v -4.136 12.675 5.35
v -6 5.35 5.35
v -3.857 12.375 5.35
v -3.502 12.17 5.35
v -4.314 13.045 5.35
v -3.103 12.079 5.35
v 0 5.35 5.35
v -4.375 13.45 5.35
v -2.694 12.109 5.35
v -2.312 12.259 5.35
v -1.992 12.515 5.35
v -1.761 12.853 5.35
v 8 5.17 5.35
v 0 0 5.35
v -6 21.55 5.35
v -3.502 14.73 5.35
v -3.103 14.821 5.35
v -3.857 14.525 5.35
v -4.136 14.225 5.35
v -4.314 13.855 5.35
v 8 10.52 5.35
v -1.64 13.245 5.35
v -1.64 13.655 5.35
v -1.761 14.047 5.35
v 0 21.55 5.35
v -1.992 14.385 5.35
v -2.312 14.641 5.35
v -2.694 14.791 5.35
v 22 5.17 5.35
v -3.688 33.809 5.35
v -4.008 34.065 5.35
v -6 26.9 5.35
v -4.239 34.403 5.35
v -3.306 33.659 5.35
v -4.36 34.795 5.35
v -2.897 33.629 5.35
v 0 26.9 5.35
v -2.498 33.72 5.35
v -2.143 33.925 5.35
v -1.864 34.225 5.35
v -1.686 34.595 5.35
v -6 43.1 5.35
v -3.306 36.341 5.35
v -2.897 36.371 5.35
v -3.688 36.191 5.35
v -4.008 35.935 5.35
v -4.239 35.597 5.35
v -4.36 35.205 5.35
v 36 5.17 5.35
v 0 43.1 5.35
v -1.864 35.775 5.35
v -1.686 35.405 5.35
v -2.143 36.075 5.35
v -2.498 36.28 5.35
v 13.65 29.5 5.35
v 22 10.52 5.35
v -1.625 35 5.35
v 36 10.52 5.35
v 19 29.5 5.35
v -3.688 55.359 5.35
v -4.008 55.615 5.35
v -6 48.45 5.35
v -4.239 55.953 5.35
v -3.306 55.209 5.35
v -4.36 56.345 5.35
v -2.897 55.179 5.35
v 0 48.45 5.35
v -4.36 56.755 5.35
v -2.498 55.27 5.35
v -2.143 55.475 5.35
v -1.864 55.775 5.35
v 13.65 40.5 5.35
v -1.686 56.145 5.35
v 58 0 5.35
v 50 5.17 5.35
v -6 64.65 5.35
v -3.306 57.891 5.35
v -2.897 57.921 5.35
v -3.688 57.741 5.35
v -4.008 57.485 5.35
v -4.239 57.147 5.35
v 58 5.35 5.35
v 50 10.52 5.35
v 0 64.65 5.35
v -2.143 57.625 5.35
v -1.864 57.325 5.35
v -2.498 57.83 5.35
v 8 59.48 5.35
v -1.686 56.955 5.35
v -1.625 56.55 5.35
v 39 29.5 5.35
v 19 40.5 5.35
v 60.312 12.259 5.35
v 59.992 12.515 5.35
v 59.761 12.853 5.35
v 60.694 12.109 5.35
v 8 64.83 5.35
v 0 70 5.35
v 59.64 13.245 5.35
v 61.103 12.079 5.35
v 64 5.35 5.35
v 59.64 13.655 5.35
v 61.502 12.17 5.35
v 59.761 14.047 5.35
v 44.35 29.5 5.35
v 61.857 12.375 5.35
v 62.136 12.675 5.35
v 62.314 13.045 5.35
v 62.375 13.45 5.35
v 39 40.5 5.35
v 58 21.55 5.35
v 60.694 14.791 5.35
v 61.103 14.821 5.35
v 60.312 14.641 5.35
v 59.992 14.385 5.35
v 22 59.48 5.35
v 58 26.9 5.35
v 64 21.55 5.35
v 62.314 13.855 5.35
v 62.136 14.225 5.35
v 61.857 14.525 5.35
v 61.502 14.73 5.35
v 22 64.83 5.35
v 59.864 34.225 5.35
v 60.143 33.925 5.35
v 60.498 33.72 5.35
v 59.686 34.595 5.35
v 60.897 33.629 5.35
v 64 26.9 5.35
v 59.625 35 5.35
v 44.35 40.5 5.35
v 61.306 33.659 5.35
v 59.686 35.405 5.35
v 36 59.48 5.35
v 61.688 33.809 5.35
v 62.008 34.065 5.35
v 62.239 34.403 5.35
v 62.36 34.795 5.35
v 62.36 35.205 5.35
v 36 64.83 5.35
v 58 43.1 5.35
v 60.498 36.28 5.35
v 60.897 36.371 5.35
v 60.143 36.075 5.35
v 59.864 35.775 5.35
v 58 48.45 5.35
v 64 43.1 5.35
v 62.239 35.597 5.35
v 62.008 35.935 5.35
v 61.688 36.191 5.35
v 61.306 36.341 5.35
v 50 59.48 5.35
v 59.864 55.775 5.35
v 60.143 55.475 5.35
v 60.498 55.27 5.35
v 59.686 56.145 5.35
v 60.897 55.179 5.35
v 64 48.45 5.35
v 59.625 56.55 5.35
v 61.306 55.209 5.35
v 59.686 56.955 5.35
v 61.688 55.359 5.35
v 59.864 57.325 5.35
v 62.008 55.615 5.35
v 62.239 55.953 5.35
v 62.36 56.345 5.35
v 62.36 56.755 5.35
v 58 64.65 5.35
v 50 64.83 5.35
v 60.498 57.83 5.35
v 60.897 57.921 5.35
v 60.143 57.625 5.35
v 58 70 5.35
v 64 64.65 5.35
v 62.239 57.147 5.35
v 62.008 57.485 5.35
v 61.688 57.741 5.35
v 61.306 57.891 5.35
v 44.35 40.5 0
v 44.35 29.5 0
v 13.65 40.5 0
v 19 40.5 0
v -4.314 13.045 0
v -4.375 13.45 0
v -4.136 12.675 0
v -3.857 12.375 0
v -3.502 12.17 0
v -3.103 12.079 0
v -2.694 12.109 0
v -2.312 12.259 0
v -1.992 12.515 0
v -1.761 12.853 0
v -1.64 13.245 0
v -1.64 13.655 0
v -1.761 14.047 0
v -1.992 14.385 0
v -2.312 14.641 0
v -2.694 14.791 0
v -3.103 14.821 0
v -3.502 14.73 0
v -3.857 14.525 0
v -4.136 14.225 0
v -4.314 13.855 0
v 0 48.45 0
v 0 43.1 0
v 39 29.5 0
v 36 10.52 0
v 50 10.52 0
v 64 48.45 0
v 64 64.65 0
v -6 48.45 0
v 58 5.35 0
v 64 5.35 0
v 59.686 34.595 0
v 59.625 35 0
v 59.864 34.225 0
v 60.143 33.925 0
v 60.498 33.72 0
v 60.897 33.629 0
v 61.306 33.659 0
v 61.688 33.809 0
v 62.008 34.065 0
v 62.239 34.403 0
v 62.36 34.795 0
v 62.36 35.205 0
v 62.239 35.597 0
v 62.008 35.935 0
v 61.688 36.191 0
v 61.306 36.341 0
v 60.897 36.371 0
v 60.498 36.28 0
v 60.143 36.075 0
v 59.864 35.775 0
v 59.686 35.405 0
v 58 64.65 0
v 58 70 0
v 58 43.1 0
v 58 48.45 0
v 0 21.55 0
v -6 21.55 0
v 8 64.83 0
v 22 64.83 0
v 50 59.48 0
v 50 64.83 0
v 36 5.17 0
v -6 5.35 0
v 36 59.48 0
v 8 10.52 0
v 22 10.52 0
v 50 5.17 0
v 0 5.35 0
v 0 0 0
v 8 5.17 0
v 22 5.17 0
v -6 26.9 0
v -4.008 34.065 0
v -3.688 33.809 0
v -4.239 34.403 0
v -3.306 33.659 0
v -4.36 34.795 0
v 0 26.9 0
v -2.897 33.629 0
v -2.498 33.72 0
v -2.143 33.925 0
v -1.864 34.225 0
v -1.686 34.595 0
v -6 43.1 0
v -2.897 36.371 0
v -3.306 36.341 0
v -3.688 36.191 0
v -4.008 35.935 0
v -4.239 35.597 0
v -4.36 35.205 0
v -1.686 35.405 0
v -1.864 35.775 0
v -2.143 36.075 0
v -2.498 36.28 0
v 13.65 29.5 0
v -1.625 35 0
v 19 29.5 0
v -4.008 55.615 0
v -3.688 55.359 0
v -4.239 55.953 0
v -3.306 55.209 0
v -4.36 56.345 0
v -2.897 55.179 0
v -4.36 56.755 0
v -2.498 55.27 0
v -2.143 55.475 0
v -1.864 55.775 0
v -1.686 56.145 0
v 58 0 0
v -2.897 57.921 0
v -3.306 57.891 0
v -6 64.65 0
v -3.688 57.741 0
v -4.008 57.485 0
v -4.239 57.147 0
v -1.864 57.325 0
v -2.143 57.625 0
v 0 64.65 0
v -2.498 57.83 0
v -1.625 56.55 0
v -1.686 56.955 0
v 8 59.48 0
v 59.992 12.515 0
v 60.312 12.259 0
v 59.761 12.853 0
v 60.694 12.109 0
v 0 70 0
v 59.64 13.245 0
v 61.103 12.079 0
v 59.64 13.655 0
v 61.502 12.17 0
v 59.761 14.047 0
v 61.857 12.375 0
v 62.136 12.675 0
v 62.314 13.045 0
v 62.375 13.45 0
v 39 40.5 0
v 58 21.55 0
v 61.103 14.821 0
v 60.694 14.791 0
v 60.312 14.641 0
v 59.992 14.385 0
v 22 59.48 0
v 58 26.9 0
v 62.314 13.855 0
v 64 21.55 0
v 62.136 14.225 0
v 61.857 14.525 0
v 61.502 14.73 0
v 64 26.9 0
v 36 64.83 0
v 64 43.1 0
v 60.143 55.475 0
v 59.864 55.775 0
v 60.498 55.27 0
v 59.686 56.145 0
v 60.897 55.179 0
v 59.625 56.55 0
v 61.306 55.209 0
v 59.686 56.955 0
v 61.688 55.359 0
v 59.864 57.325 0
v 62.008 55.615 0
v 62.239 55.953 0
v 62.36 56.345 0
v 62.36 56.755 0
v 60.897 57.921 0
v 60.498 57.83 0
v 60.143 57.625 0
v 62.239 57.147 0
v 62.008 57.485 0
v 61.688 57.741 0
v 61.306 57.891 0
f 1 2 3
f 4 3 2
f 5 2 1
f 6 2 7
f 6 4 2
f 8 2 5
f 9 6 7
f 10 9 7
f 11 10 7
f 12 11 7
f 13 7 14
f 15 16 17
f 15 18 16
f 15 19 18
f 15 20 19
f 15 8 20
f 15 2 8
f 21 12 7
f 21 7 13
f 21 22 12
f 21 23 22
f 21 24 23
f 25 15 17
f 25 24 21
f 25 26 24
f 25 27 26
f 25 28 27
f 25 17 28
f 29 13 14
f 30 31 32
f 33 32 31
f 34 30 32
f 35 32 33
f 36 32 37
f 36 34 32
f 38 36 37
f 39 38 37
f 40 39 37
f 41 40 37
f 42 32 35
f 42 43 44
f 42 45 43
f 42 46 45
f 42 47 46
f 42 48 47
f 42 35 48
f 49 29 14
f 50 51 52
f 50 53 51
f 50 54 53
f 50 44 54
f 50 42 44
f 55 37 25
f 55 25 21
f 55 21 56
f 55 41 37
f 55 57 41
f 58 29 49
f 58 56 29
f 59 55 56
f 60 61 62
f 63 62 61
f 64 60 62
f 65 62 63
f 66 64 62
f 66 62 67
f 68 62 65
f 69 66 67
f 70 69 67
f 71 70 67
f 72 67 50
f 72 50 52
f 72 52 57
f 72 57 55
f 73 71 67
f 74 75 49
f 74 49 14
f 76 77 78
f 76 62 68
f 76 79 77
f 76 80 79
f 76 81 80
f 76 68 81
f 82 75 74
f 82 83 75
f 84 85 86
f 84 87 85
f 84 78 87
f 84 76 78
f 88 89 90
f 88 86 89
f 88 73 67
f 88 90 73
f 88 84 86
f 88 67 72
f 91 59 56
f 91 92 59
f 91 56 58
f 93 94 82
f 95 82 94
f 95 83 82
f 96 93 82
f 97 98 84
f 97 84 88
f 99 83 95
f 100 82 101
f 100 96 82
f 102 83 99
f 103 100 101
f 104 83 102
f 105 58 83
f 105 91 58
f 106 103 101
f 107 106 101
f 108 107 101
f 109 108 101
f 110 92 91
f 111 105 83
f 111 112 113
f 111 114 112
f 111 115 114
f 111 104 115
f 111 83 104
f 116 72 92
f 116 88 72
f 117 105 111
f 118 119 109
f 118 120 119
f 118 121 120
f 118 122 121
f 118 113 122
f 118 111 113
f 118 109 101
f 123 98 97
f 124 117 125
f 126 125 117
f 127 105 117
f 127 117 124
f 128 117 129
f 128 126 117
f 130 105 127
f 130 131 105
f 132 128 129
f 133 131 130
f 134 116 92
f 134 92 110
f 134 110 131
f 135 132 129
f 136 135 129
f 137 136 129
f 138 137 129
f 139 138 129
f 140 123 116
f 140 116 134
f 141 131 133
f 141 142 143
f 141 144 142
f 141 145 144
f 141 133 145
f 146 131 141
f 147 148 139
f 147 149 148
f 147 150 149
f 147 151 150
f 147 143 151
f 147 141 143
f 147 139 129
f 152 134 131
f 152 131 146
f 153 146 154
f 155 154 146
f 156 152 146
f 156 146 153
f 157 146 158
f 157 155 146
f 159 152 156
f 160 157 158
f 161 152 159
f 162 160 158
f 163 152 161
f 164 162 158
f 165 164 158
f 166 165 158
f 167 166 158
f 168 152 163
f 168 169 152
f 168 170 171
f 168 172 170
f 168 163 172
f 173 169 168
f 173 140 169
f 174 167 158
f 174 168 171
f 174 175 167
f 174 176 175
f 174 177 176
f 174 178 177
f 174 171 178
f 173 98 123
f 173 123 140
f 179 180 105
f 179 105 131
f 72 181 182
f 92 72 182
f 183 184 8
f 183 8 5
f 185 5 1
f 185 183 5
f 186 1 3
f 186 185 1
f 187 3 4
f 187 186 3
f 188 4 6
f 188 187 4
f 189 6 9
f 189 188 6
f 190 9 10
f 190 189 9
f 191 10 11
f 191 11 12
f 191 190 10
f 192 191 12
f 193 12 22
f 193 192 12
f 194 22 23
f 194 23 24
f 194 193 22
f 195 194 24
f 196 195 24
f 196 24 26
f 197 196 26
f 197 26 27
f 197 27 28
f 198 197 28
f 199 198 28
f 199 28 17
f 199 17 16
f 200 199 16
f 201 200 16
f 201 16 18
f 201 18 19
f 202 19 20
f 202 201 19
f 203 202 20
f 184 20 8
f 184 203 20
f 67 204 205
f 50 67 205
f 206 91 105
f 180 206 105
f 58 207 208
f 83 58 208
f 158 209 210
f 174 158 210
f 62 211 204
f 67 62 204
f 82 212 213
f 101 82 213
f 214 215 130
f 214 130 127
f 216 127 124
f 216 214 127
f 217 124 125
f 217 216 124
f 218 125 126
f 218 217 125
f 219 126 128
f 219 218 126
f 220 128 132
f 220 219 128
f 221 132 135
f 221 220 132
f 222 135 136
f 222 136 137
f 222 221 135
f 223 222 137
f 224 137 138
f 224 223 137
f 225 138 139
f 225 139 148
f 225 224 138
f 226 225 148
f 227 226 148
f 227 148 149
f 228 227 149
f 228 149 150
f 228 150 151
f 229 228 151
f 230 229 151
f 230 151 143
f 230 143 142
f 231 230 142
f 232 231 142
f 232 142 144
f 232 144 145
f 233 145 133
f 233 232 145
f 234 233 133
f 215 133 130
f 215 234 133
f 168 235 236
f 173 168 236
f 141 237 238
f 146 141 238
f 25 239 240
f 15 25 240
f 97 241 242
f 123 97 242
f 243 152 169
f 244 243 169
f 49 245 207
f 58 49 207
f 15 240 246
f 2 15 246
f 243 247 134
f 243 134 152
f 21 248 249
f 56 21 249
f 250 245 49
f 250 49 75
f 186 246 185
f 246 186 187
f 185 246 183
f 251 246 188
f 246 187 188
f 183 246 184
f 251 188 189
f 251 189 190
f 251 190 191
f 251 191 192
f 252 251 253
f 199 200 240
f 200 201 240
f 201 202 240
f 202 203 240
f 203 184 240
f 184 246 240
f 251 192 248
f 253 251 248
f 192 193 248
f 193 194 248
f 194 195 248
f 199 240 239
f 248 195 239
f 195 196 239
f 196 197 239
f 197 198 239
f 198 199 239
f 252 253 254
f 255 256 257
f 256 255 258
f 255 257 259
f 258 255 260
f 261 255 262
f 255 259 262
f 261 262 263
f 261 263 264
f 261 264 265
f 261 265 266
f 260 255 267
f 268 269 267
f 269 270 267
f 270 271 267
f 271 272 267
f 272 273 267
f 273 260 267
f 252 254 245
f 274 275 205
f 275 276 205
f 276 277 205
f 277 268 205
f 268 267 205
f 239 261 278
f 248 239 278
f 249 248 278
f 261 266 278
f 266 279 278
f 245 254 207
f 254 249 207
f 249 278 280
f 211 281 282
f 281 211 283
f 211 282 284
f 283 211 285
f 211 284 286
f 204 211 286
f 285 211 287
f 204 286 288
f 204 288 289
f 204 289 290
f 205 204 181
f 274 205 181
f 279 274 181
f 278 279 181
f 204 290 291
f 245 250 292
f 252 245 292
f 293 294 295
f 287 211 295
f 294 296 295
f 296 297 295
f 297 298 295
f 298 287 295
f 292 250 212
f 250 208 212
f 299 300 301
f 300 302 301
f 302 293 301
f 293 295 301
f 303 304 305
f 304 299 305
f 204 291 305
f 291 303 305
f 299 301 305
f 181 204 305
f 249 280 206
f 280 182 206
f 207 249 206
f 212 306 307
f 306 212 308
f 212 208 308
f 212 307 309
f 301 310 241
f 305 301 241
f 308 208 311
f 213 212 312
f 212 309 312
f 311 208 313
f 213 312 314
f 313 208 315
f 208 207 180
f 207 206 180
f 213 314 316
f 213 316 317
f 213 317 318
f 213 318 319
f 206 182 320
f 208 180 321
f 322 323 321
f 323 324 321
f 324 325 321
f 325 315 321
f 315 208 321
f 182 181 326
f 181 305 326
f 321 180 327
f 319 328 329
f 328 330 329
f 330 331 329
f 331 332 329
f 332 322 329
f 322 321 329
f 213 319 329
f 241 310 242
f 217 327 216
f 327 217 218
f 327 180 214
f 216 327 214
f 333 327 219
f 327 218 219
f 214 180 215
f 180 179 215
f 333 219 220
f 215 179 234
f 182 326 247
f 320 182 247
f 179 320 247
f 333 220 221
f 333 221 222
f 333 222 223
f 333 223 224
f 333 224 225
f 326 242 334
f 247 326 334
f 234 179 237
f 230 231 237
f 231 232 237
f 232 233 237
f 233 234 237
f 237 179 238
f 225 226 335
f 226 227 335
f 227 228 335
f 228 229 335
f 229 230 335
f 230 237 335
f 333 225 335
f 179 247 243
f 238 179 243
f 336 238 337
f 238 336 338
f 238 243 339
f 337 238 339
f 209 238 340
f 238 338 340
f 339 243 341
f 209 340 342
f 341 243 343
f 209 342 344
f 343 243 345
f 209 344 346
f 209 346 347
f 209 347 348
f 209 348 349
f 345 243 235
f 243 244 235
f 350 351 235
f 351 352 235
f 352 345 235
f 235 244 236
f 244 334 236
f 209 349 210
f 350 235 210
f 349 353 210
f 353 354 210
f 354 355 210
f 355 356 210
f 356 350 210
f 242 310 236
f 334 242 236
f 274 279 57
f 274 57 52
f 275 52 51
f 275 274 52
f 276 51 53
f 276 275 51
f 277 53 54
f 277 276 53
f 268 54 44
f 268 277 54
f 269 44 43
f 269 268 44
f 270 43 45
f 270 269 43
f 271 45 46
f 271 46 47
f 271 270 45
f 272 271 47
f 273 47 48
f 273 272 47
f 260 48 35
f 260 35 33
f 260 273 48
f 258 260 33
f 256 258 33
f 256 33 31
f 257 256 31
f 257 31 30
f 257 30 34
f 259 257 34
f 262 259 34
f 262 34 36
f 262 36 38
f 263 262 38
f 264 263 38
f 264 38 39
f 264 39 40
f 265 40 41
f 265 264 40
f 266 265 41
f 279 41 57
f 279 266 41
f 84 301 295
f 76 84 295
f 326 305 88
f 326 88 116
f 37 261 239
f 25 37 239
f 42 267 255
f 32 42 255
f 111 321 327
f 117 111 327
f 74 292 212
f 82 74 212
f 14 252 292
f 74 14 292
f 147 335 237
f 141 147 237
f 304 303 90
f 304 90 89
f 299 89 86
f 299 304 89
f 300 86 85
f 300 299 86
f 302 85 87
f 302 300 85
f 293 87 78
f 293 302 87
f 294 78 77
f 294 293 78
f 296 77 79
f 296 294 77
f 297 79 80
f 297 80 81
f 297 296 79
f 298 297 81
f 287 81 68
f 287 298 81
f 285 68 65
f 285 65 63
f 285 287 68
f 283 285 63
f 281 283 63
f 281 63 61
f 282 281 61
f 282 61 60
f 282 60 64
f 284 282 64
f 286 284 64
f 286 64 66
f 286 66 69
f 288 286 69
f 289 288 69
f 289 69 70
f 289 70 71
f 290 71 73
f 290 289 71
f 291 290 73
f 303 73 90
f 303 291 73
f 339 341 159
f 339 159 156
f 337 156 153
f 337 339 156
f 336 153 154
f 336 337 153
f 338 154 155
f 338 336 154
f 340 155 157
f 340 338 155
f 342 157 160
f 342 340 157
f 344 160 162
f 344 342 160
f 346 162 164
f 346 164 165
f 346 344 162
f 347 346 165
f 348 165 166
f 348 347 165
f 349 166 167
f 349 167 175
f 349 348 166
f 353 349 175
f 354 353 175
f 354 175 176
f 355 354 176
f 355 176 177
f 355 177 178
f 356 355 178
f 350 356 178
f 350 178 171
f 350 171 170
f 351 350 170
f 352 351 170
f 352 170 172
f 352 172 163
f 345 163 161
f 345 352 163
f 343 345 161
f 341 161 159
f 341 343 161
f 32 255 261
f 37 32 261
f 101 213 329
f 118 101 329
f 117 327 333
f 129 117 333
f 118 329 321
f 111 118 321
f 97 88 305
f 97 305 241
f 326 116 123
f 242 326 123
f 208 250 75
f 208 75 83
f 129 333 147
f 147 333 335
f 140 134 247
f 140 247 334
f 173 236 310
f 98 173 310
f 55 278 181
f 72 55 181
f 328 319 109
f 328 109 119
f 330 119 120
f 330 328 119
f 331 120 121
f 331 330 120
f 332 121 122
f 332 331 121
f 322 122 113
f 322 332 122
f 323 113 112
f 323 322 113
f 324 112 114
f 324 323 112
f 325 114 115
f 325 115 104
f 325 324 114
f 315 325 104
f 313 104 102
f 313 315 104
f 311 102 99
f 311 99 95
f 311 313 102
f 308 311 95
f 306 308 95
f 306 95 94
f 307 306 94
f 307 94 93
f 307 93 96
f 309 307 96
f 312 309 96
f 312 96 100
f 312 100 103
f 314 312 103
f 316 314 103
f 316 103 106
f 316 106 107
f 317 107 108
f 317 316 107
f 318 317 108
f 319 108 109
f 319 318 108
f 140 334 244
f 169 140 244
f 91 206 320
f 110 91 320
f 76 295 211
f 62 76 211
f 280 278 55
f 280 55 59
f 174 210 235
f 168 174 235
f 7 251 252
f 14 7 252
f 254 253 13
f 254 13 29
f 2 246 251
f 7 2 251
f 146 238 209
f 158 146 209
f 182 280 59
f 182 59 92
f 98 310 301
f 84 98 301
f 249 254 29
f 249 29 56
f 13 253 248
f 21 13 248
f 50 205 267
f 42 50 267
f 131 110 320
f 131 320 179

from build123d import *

# Parameters (mm, degrees)
MODEL_R             = 1.375
MODEL_W             = 14
MODEL_H             = 5.35
MODEL_W_2           = 5.35
MODEL_H_2           = 11
BOSS_EXTRUDE1_DEPTH = 5.35


with BuildPart() as part:
    # Model → Boss-Extrude1 (new body)
    with BuildSketch(Plane.XY):
        Polygon((0, 0), (58, 0), (58, 5.35), (64, 5.35), (64, 21.55), (58, 21.55), (58, 26.9), (64, 26.9), (64, 43.1), (58, 43.1), (58, 48.45), (64, 48.45), (64, 64.65), (58, 64.65), (58, 70), (0, 70), (0, 64.65), (-6, 64.65), (-6, 48.45), (0, 48.45), (0, 43.1), (-6, 43.1), (-6, 26.9), (0, 26.9), (0, 21.55), (-6, 21.55), (-6, 5.35), (0, 5.35), align=None)
        with Locations((-3, 56.55)):
            Circle(MODEL_R, mode=Mode.SUBTRACT)
        with Locations(Location((61, 56.55, 0), (0, 0, 180))):
            Circle(MODEL_R, mode=Mode.SUBTRACT)
        with Locations((61, 13.45)):
            Circle(MODEL_R, mode=Mode.SUBTRACT)
        with Locations(Location((-3, 13.45, 0), (0, 0, 180))):
            Circle(MODEL_R, mode=Mode.SUBTRACT)
        with Locations((-3, 35)):
            Circle(MODEL_R, mode=Mode.SUBTRACT)
        with Locations(Location((61, 35, 0), (0, 0, 180))):
            Circle(MODEL_R, mode=Mode.SUBTRACT)
        with Locations((15, 62.155)):
            Rectangle(MODEL_W, MODEL_H, mode=Mode.SUBTRACT)
        with Locations((43, 62.155)):
            Rectangle(MODEL_W, MODEL_H, mode=Mode.SUBTRACT)
        with Locations((43, 7.845)):
            Rectangle(MODEL_W, MODEL_H, mode=Mode.SUBTRACT)
        with Locations((15, 7.845)):
            Rectangle(MODEL_W, MODEL_H, mode=Mode.SUBTRACT)
        with Locations((16.325, 35)):
            Rectangle(MODEL_W_2, MODEL_H_2, mode=Mode.SUBTRACT)
        with Locations((41.675, 35)):
            Rectangle(MODEL_W_2, MODEL_H_2, mode=Mode.SUBTRACT)
    extrude(amount=BOSS_EXTRUDE1_DEPTH)


solid = part.part
